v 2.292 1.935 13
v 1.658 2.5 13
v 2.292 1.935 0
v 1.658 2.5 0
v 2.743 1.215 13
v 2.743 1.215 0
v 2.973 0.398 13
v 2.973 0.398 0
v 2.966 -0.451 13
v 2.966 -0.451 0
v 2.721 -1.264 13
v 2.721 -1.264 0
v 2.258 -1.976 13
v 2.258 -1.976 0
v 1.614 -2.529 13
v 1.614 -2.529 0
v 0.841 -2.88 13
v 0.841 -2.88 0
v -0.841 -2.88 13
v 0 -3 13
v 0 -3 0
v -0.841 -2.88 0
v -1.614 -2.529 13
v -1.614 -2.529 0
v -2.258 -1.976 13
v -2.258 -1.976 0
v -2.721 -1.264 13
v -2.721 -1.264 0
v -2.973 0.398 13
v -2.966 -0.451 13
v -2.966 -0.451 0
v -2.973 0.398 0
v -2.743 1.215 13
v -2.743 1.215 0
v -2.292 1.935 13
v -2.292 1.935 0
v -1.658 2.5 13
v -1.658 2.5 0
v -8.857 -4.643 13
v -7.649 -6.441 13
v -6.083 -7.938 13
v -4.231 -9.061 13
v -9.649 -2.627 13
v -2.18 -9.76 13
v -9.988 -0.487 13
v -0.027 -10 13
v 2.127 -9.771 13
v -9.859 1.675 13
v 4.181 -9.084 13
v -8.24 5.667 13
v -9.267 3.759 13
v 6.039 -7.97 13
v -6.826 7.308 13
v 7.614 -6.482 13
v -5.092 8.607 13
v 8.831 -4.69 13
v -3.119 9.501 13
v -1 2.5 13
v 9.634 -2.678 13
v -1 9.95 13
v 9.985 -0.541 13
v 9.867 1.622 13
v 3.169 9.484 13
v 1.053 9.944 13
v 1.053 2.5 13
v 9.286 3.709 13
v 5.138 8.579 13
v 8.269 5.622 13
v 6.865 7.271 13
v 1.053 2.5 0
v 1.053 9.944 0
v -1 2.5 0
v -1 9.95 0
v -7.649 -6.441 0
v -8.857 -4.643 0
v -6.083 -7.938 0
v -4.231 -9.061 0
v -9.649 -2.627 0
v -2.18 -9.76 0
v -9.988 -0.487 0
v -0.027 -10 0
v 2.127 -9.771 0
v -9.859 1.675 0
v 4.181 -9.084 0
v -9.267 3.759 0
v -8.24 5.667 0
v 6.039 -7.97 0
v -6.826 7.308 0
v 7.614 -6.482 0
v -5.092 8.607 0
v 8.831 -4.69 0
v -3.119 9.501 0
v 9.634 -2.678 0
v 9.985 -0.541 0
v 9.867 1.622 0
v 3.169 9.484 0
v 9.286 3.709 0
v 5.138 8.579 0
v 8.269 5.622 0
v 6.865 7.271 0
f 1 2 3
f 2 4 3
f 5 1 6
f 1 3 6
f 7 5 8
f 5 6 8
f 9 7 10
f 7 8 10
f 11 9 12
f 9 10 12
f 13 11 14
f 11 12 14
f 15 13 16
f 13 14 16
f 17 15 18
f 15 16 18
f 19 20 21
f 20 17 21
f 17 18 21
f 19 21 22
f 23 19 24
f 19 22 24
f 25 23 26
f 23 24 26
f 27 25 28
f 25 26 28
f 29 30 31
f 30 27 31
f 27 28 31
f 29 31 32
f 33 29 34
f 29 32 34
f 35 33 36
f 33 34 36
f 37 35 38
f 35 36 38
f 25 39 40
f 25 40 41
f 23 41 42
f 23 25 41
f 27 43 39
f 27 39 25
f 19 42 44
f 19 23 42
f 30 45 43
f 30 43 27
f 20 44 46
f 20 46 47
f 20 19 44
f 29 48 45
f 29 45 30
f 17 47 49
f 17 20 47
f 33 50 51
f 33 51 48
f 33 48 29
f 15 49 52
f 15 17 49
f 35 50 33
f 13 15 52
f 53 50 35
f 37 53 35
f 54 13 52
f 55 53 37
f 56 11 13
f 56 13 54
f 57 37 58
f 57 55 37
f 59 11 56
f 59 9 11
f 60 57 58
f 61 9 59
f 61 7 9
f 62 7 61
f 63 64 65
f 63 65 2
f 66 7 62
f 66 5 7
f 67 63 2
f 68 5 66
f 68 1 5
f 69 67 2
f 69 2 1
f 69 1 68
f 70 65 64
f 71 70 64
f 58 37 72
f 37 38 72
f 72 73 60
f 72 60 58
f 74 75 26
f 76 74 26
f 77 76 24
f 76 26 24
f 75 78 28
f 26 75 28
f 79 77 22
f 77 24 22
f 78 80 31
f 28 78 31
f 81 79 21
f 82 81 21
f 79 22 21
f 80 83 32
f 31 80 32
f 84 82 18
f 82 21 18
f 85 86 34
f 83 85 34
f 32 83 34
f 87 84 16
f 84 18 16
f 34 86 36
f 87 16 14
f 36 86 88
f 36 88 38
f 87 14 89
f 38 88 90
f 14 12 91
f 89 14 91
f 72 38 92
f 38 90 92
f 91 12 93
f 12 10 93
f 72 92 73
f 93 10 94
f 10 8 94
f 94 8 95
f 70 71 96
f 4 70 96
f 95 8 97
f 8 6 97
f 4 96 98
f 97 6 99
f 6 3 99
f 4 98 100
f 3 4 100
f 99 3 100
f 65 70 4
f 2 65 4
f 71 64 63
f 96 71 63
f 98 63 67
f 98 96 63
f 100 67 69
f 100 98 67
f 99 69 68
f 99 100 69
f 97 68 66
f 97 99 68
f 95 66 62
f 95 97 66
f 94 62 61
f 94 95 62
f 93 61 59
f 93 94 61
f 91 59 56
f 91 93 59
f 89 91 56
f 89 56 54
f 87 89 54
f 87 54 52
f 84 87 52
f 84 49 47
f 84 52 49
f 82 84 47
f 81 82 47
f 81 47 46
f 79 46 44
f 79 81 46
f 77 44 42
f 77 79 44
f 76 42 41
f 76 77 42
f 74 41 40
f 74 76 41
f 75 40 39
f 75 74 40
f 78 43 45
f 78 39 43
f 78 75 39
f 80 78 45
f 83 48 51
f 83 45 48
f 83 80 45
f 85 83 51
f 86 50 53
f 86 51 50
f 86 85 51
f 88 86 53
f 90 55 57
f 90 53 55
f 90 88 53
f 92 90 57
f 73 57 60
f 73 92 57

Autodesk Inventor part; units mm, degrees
ref_plane "YZ Plane" through (0, 0, 0) normal (1, 0, 0) x (0, 1, 0)
ref_plane "XZ Plane" through (0, 0, 0) normal (0, 1, 0) x (-1, 0, 0)
ref_plane "XY Plane" through (0, 0, 0) normal (0, 0, 1) x (1, 0, 0)
sketch "Sketch1" plane through (0, 0, 0) normal (0, 0, 1) x (1, 0, 0)
  arc A0 (-1.6583, 2.5) -> (1.6583, 2.5) centre (0, 0) ccw
  arc A1 (-1, 9.9499) -> (1.0526, 9.9444) centre (0, 0) ccw
  line L0 (1.0526, 2.5) -> (1.0526, 9.9444)
  line L1 (-1, 9.9499) -> (-1, 2.5)
  line L2 (-1.6583, 2.5) -> (-1, 2.5)
  line L3 (1.0526, 2.5) -> (1.6583, 2.5)
  dimension "d0" = 6
  dimension "d2" = 20
  dimension "d4" = 1
extrude "Extrusion1" add sketch "Sketch1" along normal blind 13
equation "\"BendRadius\" = Thickness"
equation "\"BendReliefWidth\" = Thickness"
equation "\"BendReliefDepth\" = 0.5 * Thickness"
equation "\"CornerReliefSize\" = 4 * Thickness"
equation "\"MinimumRemnant\" = 2 * Thickness"
equation "\"TransitionRadius\" = BendRadius"
equation "\"JacobiRadiusSize\" = BendRadius"
equation "\"GapSize\" = Thickness"
equation "\"Thickness\" = 0.5"
properties part number "Reducer bushing"
